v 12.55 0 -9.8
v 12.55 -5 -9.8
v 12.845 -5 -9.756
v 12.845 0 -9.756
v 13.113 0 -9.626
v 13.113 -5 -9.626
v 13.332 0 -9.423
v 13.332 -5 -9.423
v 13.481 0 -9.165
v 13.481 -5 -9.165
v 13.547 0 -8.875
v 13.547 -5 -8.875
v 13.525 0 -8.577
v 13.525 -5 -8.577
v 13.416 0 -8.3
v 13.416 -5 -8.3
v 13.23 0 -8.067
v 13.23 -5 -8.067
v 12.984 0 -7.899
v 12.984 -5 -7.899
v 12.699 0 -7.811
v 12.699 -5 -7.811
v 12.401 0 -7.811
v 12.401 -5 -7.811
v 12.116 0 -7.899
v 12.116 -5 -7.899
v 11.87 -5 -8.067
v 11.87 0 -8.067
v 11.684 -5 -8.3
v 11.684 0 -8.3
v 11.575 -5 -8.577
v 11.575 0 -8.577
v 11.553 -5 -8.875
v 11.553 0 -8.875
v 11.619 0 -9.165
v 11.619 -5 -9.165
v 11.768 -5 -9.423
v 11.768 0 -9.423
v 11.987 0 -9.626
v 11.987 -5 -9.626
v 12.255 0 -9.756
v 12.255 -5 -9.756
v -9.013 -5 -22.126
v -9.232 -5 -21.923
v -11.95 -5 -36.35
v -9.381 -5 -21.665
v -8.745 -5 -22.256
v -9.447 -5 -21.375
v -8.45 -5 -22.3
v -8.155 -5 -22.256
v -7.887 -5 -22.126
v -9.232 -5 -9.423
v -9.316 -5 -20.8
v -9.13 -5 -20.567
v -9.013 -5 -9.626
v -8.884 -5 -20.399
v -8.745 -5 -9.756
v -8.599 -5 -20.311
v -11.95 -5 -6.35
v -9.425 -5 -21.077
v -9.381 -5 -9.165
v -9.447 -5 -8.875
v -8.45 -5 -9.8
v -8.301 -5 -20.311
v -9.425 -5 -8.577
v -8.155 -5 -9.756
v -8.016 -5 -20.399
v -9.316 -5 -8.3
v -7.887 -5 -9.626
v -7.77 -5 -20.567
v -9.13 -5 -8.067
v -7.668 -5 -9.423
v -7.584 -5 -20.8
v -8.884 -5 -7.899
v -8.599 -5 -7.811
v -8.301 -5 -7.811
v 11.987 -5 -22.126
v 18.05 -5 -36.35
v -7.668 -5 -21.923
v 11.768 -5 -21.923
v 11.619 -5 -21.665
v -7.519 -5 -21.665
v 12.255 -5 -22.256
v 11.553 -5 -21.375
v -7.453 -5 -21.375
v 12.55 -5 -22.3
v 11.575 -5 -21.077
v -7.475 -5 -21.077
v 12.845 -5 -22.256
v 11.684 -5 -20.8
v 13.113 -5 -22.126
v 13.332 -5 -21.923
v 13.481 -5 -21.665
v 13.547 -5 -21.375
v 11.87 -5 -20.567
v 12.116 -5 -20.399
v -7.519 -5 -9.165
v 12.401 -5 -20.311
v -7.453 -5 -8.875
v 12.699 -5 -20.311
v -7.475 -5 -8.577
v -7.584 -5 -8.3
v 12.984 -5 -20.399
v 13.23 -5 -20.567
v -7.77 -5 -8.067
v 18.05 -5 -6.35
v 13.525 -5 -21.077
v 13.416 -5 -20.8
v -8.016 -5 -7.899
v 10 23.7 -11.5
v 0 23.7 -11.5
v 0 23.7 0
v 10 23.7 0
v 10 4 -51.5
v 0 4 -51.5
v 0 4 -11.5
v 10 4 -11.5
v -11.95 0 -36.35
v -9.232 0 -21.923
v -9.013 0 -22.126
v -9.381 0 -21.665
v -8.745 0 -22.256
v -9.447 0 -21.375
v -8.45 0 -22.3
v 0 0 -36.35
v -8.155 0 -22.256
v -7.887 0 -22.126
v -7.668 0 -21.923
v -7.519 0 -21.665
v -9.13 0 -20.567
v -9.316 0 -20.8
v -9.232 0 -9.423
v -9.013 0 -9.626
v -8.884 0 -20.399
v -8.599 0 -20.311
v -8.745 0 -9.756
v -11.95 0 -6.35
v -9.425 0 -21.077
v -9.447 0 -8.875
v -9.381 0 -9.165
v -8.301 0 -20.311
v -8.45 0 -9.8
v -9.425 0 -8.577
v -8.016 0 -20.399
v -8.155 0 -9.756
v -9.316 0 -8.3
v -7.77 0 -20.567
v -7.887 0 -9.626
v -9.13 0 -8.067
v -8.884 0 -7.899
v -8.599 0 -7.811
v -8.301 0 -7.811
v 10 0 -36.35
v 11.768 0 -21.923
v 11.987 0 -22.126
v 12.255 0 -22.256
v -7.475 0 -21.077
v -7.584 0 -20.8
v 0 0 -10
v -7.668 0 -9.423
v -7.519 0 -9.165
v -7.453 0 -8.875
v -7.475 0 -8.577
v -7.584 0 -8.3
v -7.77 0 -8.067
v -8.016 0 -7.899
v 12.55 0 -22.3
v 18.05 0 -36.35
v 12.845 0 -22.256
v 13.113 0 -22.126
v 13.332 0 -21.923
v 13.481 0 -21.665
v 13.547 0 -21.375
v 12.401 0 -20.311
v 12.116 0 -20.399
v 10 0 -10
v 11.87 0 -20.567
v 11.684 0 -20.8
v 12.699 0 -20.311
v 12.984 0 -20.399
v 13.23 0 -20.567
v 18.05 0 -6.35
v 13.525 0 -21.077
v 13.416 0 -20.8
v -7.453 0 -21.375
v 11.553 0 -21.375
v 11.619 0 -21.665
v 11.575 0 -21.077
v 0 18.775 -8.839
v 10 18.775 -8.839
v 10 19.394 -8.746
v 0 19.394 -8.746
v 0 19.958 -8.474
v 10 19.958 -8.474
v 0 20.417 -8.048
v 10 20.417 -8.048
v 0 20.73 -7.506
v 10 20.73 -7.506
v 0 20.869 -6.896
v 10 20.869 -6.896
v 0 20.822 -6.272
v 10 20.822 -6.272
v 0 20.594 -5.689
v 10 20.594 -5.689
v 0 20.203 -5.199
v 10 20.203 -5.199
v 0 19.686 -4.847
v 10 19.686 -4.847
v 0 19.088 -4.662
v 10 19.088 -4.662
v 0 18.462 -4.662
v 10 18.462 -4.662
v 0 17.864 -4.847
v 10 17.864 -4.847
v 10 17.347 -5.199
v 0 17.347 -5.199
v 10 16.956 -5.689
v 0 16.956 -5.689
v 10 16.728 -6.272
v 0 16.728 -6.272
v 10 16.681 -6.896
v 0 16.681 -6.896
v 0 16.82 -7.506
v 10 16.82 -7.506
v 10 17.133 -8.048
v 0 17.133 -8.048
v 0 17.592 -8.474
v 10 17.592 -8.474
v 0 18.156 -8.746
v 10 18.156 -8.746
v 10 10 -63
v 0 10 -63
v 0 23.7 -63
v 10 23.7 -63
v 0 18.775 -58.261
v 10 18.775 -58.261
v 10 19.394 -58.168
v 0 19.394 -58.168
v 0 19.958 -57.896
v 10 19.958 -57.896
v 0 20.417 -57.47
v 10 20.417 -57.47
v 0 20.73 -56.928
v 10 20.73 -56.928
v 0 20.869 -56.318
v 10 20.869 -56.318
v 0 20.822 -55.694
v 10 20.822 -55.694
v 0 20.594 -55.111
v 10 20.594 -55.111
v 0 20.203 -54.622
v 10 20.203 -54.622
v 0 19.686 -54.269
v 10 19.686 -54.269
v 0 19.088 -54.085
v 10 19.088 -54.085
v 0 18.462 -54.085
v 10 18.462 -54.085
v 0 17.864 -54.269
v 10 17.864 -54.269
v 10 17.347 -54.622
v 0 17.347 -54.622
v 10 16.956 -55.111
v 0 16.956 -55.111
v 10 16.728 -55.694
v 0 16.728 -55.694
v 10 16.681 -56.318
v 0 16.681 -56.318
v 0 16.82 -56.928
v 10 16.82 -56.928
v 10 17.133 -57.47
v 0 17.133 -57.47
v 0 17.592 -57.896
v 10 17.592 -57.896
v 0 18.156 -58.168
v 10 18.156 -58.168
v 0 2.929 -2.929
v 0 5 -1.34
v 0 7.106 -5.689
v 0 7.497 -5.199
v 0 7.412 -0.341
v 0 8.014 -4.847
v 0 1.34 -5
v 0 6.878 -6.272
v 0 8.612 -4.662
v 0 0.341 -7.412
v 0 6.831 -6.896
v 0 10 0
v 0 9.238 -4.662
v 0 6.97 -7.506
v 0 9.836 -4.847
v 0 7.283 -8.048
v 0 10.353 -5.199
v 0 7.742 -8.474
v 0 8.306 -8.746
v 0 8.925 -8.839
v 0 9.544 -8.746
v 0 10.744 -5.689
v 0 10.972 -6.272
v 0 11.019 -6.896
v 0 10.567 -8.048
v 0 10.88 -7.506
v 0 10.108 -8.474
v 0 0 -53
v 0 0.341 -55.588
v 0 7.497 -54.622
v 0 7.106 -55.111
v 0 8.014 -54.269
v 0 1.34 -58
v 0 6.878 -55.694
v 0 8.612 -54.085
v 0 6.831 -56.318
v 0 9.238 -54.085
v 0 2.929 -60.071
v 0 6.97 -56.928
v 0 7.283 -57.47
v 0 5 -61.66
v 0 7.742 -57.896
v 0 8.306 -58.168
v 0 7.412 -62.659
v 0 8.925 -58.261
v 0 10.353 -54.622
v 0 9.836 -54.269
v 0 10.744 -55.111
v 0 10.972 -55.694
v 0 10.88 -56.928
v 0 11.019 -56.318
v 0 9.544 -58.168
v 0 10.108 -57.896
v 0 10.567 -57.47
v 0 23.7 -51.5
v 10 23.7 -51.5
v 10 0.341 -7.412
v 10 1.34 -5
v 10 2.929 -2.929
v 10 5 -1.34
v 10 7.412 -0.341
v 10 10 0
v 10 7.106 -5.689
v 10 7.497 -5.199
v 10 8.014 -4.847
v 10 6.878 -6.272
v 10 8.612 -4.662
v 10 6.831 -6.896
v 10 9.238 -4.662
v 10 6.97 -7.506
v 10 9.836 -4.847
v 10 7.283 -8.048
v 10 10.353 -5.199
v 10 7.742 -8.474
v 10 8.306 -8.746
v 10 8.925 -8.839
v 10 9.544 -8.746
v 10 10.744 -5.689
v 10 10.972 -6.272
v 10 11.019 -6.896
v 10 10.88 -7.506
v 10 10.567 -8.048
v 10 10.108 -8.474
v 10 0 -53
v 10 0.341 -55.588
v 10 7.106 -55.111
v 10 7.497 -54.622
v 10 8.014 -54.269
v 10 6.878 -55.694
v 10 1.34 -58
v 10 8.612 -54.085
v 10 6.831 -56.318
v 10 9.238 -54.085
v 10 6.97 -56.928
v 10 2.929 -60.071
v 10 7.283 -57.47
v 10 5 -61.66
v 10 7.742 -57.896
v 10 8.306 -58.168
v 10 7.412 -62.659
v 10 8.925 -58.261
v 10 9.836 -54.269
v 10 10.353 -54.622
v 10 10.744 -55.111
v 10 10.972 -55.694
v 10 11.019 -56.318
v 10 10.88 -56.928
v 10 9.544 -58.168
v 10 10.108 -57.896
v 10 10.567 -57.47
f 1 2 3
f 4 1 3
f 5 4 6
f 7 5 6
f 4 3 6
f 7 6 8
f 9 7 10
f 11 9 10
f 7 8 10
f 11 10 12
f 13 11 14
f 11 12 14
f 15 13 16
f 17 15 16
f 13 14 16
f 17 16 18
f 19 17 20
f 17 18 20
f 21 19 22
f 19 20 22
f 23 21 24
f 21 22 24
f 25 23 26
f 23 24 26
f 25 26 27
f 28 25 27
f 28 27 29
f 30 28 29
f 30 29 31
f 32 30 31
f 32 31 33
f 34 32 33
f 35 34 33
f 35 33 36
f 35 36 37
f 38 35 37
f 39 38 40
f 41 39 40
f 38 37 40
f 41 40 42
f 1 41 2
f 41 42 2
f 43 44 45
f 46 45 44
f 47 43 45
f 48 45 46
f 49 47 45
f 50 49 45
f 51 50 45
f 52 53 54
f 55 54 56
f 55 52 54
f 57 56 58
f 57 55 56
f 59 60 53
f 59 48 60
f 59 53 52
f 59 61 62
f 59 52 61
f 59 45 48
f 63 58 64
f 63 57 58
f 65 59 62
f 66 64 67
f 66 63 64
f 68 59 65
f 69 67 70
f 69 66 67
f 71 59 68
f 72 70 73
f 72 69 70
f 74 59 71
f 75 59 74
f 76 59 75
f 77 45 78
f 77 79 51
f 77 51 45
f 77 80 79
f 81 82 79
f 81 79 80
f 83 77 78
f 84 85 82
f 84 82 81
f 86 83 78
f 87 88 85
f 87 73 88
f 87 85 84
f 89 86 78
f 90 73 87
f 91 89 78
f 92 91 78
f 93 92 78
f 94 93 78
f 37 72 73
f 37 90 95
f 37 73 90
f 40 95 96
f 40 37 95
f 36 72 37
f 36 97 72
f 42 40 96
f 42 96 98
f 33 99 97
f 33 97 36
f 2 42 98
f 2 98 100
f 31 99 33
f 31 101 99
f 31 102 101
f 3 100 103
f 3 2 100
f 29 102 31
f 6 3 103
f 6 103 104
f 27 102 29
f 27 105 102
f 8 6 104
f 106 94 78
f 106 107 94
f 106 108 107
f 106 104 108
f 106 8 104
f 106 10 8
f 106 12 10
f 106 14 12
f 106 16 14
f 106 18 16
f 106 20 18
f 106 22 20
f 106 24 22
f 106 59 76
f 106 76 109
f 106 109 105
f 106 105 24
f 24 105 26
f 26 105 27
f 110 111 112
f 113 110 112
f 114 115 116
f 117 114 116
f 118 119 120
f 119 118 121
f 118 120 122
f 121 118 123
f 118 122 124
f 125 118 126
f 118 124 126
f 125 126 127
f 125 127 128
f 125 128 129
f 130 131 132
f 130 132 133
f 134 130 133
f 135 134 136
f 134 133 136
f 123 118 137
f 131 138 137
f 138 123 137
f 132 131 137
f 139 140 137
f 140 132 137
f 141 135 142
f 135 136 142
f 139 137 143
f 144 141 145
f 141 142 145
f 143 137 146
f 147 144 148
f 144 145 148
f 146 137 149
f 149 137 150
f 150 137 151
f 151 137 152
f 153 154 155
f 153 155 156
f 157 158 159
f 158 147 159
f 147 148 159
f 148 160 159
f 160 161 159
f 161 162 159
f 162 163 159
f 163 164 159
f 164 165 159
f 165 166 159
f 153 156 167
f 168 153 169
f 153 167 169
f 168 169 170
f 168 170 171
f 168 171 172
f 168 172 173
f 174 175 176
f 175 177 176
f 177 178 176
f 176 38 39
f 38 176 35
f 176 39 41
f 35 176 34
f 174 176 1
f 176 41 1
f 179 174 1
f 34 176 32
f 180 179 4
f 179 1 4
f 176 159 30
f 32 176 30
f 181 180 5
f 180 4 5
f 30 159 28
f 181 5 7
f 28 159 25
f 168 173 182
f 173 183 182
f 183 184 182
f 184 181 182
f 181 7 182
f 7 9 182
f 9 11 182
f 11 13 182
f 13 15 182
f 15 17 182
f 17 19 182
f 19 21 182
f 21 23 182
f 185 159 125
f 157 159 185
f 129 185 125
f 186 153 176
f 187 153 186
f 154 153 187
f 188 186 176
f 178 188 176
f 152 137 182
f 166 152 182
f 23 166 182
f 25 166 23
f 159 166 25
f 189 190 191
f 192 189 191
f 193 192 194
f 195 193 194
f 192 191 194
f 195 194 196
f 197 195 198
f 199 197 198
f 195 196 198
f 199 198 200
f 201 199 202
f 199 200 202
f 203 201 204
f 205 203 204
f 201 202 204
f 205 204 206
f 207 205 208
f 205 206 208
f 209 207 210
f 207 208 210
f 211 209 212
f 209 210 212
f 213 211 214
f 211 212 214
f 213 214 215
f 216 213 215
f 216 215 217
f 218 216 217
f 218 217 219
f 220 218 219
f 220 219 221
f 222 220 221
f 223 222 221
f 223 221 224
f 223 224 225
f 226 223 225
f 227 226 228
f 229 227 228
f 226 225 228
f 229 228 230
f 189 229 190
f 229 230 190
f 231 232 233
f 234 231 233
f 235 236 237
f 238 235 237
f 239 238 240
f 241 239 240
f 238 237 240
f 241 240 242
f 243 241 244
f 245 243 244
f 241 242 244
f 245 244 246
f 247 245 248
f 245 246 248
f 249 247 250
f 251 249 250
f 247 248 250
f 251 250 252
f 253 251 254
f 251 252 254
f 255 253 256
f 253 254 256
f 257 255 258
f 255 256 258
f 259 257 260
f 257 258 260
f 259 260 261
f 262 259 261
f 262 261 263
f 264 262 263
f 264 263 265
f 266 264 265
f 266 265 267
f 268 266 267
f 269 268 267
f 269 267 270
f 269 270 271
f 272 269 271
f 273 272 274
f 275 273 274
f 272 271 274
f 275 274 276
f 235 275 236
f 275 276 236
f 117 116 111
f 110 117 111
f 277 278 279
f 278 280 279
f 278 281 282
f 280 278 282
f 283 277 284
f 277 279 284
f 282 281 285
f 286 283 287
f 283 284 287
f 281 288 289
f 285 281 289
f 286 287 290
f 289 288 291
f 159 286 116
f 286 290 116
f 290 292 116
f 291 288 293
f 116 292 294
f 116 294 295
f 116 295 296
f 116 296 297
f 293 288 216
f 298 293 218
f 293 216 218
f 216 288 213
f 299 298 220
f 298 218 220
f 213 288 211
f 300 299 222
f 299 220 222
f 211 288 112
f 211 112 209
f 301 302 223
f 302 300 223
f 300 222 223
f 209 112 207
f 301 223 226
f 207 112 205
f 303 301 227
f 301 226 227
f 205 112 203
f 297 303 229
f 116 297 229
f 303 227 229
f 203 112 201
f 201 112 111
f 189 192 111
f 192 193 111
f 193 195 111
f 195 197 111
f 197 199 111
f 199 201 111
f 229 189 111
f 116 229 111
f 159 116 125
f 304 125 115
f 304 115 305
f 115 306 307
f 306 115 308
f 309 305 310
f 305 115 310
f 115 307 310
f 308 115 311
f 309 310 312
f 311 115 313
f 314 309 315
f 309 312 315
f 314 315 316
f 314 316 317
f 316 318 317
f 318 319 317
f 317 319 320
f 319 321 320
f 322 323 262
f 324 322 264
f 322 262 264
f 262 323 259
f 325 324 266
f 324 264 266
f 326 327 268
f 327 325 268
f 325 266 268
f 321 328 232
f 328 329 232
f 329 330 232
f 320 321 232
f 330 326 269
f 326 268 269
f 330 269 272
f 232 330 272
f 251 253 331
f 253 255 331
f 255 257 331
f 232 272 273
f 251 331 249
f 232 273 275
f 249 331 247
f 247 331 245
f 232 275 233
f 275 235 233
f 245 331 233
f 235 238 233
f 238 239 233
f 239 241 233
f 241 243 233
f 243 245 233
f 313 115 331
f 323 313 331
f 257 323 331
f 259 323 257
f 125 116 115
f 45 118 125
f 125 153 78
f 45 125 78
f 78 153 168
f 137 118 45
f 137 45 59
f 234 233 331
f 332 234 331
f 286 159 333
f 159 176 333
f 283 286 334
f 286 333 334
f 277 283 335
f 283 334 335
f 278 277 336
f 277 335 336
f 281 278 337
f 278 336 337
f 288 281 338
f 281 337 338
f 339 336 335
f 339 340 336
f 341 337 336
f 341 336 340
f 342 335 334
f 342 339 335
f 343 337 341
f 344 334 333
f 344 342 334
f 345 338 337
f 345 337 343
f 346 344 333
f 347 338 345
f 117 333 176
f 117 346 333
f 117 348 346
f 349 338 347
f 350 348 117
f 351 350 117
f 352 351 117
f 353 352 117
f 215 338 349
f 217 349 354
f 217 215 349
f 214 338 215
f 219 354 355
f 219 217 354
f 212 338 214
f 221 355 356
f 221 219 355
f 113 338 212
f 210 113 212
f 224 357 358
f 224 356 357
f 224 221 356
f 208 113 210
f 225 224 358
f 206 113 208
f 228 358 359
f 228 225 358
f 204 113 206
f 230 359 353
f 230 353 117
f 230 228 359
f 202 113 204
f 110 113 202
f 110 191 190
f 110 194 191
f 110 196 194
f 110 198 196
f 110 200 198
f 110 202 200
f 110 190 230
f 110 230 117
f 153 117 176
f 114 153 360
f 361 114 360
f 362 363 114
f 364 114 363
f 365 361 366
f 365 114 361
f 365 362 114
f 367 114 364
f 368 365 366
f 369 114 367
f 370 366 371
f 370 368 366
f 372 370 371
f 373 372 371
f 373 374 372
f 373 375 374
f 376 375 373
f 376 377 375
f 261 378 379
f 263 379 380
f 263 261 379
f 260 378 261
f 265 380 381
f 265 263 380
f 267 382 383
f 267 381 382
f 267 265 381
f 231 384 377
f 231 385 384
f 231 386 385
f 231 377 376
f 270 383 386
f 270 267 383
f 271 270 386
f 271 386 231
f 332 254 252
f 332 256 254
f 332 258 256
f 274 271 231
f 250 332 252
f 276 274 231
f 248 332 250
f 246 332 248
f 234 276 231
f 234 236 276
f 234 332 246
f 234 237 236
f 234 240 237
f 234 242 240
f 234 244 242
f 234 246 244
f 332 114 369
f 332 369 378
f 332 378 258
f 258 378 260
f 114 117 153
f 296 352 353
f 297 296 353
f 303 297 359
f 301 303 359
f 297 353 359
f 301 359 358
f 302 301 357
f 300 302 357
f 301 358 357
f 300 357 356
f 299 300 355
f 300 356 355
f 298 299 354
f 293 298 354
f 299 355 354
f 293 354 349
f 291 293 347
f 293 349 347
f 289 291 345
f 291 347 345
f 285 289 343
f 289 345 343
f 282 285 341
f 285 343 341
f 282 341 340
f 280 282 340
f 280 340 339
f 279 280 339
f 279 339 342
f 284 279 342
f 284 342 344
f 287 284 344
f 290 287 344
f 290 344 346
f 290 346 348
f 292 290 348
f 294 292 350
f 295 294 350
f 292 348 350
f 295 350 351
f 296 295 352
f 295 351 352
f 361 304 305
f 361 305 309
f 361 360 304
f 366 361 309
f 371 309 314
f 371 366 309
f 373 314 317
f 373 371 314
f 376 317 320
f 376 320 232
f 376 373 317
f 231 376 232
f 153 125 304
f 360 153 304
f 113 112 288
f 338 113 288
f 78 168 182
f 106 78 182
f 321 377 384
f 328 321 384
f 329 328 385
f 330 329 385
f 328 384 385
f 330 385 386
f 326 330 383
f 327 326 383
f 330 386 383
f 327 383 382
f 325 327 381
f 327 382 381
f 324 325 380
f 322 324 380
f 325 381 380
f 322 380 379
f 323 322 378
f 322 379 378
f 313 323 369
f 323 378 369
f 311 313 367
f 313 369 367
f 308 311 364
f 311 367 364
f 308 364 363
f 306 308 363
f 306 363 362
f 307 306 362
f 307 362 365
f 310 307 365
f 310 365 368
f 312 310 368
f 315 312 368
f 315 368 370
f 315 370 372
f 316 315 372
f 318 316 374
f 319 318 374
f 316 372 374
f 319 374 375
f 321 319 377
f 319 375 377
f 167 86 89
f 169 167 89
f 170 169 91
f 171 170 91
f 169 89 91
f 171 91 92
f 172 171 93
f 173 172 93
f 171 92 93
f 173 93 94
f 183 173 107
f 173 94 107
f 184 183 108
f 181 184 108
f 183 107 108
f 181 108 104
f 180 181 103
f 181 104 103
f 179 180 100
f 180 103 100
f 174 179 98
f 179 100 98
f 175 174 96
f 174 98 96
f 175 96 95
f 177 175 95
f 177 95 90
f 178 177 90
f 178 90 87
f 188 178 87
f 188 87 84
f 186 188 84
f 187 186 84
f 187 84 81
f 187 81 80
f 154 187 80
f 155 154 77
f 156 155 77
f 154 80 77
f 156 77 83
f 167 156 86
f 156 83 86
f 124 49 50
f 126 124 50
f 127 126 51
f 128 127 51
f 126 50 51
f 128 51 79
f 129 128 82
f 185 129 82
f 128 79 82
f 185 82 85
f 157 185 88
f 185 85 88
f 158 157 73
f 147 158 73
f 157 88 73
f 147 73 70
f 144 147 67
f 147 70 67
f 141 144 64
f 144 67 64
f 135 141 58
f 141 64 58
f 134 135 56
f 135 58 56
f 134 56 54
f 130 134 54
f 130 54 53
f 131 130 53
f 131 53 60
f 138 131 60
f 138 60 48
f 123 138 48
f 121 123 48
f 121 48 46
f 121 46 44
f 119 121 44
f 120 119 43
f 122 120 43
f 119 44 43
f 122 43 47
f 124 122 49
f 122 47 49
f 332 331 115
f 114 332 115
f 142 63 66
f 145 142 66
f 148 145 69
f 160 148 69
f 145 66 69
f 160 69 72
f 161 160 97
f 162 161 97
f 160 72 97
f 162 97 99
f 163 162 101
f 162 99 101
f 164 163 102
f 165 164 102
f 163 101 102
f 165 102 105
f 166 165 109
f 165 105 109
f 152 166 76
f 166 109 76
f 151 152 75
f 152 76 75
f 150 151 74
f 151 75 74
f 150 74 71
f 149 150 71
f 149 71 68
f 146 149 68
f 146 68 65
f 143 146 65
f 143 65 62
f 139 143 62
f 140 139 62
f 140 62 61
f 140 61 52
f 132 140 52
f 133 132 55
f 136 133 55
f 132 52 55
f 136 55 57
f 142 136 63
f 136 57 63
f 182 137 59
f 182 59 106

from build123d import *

# Parameters (mm, degrees)
BOSS_EXTRUDE1_DEPTH = 10
SKETCH3_R           = 2.1
CUT_EXTRUDE2_DEPTH  = 10
FILLET1_R           = 10
SKETCH4_W           = 30
SKETCH4_H           = 30
BOSS_EXTRUDE2_DEPTH = 5
SKETCH6_R           = 1
CUT_EXTRUDE3_DEPTH  = 5


with BuildPart() as part:
    # Sketch2 → Boss-Extrude1 (new body)
    with BuildSketch(Plane(origin=(0, 0, 0), x_dir=(0, 0, -1), z_dir=(1, 0, 0))):
        Polygon((0, 0), (63, 0), (63, 23.7), (51.5, 23.7), (51.5, 4), (11.5, 4), (11.5, 23.7), (0, 23.7), align=None)
    extrude(amount=BOSS_EXTRUDE1_DEPTH)

    # Sketch3 → Cut-Extrude2 (cut)
    with BuildSketch(Plane(origin=(10, 0, 0), x_dir=(0, 0, -1), z_dir=(1, 0, 0))):
        with Locations((6.738854382, 18.775)):
            Circle(SKETCH3_R)
        with Locations((56.161145618, 18.775)):
            Circle(SKETCH3_R)
        with Locations((56.161145618, 8.925)):
            Circle(SKETCH3_R)
        with Locations((6.738854382, 8.925)):
            Circle(SKETCH3_R)
    extrude(amount=-CUT_EXTRUDE2_DEPTH, mode=Mode.SUBTRACT)

    # Fillet1
    fillet1_edges = [part.edges().sort_by_distance(p)[0] for p in [
        (5, 0, -63),
        (5, 0, 0),
    ]]
    fillet(fillet1_edges, radius=FILLET1_R)

    # Sketch4 → Boss-Extrude2 (add)
    with BuildSketch(Plane.XZ):
        with Locations((3.05, -21.35)):
            Rectangle(SKETCH4_W, SKETCH4_H)
    extrude(amount=BOSS_EXTRUDE2_DEPTH)

    # Sketch6 → Cut-Extrude3 (cut)
    with BuildSketch(Plane.XZ.offset(5)):
        with Locations(Location((-8.45, -8.8, 0), (0, 0, 270))):
            Circle(SKETCH6_R)
        with Locations(Location((12.55, -8.8, 0), (0, 0, 270))):
            Circle(SKETCH6_R)
        with Locations(Location((12.55, -21.3, 0), (0, 0, 270))):
            Circle(SKETCH6_R)
        with Locations(Location((-8.45, -21.3, 0), (0, 0, 270))):
            Circle(SKETCH6_R)
    extrude(amount=-CUT_EXTRUDE3_DEPTH, mode=Mode.SUBTRACT)


solid = part.part
